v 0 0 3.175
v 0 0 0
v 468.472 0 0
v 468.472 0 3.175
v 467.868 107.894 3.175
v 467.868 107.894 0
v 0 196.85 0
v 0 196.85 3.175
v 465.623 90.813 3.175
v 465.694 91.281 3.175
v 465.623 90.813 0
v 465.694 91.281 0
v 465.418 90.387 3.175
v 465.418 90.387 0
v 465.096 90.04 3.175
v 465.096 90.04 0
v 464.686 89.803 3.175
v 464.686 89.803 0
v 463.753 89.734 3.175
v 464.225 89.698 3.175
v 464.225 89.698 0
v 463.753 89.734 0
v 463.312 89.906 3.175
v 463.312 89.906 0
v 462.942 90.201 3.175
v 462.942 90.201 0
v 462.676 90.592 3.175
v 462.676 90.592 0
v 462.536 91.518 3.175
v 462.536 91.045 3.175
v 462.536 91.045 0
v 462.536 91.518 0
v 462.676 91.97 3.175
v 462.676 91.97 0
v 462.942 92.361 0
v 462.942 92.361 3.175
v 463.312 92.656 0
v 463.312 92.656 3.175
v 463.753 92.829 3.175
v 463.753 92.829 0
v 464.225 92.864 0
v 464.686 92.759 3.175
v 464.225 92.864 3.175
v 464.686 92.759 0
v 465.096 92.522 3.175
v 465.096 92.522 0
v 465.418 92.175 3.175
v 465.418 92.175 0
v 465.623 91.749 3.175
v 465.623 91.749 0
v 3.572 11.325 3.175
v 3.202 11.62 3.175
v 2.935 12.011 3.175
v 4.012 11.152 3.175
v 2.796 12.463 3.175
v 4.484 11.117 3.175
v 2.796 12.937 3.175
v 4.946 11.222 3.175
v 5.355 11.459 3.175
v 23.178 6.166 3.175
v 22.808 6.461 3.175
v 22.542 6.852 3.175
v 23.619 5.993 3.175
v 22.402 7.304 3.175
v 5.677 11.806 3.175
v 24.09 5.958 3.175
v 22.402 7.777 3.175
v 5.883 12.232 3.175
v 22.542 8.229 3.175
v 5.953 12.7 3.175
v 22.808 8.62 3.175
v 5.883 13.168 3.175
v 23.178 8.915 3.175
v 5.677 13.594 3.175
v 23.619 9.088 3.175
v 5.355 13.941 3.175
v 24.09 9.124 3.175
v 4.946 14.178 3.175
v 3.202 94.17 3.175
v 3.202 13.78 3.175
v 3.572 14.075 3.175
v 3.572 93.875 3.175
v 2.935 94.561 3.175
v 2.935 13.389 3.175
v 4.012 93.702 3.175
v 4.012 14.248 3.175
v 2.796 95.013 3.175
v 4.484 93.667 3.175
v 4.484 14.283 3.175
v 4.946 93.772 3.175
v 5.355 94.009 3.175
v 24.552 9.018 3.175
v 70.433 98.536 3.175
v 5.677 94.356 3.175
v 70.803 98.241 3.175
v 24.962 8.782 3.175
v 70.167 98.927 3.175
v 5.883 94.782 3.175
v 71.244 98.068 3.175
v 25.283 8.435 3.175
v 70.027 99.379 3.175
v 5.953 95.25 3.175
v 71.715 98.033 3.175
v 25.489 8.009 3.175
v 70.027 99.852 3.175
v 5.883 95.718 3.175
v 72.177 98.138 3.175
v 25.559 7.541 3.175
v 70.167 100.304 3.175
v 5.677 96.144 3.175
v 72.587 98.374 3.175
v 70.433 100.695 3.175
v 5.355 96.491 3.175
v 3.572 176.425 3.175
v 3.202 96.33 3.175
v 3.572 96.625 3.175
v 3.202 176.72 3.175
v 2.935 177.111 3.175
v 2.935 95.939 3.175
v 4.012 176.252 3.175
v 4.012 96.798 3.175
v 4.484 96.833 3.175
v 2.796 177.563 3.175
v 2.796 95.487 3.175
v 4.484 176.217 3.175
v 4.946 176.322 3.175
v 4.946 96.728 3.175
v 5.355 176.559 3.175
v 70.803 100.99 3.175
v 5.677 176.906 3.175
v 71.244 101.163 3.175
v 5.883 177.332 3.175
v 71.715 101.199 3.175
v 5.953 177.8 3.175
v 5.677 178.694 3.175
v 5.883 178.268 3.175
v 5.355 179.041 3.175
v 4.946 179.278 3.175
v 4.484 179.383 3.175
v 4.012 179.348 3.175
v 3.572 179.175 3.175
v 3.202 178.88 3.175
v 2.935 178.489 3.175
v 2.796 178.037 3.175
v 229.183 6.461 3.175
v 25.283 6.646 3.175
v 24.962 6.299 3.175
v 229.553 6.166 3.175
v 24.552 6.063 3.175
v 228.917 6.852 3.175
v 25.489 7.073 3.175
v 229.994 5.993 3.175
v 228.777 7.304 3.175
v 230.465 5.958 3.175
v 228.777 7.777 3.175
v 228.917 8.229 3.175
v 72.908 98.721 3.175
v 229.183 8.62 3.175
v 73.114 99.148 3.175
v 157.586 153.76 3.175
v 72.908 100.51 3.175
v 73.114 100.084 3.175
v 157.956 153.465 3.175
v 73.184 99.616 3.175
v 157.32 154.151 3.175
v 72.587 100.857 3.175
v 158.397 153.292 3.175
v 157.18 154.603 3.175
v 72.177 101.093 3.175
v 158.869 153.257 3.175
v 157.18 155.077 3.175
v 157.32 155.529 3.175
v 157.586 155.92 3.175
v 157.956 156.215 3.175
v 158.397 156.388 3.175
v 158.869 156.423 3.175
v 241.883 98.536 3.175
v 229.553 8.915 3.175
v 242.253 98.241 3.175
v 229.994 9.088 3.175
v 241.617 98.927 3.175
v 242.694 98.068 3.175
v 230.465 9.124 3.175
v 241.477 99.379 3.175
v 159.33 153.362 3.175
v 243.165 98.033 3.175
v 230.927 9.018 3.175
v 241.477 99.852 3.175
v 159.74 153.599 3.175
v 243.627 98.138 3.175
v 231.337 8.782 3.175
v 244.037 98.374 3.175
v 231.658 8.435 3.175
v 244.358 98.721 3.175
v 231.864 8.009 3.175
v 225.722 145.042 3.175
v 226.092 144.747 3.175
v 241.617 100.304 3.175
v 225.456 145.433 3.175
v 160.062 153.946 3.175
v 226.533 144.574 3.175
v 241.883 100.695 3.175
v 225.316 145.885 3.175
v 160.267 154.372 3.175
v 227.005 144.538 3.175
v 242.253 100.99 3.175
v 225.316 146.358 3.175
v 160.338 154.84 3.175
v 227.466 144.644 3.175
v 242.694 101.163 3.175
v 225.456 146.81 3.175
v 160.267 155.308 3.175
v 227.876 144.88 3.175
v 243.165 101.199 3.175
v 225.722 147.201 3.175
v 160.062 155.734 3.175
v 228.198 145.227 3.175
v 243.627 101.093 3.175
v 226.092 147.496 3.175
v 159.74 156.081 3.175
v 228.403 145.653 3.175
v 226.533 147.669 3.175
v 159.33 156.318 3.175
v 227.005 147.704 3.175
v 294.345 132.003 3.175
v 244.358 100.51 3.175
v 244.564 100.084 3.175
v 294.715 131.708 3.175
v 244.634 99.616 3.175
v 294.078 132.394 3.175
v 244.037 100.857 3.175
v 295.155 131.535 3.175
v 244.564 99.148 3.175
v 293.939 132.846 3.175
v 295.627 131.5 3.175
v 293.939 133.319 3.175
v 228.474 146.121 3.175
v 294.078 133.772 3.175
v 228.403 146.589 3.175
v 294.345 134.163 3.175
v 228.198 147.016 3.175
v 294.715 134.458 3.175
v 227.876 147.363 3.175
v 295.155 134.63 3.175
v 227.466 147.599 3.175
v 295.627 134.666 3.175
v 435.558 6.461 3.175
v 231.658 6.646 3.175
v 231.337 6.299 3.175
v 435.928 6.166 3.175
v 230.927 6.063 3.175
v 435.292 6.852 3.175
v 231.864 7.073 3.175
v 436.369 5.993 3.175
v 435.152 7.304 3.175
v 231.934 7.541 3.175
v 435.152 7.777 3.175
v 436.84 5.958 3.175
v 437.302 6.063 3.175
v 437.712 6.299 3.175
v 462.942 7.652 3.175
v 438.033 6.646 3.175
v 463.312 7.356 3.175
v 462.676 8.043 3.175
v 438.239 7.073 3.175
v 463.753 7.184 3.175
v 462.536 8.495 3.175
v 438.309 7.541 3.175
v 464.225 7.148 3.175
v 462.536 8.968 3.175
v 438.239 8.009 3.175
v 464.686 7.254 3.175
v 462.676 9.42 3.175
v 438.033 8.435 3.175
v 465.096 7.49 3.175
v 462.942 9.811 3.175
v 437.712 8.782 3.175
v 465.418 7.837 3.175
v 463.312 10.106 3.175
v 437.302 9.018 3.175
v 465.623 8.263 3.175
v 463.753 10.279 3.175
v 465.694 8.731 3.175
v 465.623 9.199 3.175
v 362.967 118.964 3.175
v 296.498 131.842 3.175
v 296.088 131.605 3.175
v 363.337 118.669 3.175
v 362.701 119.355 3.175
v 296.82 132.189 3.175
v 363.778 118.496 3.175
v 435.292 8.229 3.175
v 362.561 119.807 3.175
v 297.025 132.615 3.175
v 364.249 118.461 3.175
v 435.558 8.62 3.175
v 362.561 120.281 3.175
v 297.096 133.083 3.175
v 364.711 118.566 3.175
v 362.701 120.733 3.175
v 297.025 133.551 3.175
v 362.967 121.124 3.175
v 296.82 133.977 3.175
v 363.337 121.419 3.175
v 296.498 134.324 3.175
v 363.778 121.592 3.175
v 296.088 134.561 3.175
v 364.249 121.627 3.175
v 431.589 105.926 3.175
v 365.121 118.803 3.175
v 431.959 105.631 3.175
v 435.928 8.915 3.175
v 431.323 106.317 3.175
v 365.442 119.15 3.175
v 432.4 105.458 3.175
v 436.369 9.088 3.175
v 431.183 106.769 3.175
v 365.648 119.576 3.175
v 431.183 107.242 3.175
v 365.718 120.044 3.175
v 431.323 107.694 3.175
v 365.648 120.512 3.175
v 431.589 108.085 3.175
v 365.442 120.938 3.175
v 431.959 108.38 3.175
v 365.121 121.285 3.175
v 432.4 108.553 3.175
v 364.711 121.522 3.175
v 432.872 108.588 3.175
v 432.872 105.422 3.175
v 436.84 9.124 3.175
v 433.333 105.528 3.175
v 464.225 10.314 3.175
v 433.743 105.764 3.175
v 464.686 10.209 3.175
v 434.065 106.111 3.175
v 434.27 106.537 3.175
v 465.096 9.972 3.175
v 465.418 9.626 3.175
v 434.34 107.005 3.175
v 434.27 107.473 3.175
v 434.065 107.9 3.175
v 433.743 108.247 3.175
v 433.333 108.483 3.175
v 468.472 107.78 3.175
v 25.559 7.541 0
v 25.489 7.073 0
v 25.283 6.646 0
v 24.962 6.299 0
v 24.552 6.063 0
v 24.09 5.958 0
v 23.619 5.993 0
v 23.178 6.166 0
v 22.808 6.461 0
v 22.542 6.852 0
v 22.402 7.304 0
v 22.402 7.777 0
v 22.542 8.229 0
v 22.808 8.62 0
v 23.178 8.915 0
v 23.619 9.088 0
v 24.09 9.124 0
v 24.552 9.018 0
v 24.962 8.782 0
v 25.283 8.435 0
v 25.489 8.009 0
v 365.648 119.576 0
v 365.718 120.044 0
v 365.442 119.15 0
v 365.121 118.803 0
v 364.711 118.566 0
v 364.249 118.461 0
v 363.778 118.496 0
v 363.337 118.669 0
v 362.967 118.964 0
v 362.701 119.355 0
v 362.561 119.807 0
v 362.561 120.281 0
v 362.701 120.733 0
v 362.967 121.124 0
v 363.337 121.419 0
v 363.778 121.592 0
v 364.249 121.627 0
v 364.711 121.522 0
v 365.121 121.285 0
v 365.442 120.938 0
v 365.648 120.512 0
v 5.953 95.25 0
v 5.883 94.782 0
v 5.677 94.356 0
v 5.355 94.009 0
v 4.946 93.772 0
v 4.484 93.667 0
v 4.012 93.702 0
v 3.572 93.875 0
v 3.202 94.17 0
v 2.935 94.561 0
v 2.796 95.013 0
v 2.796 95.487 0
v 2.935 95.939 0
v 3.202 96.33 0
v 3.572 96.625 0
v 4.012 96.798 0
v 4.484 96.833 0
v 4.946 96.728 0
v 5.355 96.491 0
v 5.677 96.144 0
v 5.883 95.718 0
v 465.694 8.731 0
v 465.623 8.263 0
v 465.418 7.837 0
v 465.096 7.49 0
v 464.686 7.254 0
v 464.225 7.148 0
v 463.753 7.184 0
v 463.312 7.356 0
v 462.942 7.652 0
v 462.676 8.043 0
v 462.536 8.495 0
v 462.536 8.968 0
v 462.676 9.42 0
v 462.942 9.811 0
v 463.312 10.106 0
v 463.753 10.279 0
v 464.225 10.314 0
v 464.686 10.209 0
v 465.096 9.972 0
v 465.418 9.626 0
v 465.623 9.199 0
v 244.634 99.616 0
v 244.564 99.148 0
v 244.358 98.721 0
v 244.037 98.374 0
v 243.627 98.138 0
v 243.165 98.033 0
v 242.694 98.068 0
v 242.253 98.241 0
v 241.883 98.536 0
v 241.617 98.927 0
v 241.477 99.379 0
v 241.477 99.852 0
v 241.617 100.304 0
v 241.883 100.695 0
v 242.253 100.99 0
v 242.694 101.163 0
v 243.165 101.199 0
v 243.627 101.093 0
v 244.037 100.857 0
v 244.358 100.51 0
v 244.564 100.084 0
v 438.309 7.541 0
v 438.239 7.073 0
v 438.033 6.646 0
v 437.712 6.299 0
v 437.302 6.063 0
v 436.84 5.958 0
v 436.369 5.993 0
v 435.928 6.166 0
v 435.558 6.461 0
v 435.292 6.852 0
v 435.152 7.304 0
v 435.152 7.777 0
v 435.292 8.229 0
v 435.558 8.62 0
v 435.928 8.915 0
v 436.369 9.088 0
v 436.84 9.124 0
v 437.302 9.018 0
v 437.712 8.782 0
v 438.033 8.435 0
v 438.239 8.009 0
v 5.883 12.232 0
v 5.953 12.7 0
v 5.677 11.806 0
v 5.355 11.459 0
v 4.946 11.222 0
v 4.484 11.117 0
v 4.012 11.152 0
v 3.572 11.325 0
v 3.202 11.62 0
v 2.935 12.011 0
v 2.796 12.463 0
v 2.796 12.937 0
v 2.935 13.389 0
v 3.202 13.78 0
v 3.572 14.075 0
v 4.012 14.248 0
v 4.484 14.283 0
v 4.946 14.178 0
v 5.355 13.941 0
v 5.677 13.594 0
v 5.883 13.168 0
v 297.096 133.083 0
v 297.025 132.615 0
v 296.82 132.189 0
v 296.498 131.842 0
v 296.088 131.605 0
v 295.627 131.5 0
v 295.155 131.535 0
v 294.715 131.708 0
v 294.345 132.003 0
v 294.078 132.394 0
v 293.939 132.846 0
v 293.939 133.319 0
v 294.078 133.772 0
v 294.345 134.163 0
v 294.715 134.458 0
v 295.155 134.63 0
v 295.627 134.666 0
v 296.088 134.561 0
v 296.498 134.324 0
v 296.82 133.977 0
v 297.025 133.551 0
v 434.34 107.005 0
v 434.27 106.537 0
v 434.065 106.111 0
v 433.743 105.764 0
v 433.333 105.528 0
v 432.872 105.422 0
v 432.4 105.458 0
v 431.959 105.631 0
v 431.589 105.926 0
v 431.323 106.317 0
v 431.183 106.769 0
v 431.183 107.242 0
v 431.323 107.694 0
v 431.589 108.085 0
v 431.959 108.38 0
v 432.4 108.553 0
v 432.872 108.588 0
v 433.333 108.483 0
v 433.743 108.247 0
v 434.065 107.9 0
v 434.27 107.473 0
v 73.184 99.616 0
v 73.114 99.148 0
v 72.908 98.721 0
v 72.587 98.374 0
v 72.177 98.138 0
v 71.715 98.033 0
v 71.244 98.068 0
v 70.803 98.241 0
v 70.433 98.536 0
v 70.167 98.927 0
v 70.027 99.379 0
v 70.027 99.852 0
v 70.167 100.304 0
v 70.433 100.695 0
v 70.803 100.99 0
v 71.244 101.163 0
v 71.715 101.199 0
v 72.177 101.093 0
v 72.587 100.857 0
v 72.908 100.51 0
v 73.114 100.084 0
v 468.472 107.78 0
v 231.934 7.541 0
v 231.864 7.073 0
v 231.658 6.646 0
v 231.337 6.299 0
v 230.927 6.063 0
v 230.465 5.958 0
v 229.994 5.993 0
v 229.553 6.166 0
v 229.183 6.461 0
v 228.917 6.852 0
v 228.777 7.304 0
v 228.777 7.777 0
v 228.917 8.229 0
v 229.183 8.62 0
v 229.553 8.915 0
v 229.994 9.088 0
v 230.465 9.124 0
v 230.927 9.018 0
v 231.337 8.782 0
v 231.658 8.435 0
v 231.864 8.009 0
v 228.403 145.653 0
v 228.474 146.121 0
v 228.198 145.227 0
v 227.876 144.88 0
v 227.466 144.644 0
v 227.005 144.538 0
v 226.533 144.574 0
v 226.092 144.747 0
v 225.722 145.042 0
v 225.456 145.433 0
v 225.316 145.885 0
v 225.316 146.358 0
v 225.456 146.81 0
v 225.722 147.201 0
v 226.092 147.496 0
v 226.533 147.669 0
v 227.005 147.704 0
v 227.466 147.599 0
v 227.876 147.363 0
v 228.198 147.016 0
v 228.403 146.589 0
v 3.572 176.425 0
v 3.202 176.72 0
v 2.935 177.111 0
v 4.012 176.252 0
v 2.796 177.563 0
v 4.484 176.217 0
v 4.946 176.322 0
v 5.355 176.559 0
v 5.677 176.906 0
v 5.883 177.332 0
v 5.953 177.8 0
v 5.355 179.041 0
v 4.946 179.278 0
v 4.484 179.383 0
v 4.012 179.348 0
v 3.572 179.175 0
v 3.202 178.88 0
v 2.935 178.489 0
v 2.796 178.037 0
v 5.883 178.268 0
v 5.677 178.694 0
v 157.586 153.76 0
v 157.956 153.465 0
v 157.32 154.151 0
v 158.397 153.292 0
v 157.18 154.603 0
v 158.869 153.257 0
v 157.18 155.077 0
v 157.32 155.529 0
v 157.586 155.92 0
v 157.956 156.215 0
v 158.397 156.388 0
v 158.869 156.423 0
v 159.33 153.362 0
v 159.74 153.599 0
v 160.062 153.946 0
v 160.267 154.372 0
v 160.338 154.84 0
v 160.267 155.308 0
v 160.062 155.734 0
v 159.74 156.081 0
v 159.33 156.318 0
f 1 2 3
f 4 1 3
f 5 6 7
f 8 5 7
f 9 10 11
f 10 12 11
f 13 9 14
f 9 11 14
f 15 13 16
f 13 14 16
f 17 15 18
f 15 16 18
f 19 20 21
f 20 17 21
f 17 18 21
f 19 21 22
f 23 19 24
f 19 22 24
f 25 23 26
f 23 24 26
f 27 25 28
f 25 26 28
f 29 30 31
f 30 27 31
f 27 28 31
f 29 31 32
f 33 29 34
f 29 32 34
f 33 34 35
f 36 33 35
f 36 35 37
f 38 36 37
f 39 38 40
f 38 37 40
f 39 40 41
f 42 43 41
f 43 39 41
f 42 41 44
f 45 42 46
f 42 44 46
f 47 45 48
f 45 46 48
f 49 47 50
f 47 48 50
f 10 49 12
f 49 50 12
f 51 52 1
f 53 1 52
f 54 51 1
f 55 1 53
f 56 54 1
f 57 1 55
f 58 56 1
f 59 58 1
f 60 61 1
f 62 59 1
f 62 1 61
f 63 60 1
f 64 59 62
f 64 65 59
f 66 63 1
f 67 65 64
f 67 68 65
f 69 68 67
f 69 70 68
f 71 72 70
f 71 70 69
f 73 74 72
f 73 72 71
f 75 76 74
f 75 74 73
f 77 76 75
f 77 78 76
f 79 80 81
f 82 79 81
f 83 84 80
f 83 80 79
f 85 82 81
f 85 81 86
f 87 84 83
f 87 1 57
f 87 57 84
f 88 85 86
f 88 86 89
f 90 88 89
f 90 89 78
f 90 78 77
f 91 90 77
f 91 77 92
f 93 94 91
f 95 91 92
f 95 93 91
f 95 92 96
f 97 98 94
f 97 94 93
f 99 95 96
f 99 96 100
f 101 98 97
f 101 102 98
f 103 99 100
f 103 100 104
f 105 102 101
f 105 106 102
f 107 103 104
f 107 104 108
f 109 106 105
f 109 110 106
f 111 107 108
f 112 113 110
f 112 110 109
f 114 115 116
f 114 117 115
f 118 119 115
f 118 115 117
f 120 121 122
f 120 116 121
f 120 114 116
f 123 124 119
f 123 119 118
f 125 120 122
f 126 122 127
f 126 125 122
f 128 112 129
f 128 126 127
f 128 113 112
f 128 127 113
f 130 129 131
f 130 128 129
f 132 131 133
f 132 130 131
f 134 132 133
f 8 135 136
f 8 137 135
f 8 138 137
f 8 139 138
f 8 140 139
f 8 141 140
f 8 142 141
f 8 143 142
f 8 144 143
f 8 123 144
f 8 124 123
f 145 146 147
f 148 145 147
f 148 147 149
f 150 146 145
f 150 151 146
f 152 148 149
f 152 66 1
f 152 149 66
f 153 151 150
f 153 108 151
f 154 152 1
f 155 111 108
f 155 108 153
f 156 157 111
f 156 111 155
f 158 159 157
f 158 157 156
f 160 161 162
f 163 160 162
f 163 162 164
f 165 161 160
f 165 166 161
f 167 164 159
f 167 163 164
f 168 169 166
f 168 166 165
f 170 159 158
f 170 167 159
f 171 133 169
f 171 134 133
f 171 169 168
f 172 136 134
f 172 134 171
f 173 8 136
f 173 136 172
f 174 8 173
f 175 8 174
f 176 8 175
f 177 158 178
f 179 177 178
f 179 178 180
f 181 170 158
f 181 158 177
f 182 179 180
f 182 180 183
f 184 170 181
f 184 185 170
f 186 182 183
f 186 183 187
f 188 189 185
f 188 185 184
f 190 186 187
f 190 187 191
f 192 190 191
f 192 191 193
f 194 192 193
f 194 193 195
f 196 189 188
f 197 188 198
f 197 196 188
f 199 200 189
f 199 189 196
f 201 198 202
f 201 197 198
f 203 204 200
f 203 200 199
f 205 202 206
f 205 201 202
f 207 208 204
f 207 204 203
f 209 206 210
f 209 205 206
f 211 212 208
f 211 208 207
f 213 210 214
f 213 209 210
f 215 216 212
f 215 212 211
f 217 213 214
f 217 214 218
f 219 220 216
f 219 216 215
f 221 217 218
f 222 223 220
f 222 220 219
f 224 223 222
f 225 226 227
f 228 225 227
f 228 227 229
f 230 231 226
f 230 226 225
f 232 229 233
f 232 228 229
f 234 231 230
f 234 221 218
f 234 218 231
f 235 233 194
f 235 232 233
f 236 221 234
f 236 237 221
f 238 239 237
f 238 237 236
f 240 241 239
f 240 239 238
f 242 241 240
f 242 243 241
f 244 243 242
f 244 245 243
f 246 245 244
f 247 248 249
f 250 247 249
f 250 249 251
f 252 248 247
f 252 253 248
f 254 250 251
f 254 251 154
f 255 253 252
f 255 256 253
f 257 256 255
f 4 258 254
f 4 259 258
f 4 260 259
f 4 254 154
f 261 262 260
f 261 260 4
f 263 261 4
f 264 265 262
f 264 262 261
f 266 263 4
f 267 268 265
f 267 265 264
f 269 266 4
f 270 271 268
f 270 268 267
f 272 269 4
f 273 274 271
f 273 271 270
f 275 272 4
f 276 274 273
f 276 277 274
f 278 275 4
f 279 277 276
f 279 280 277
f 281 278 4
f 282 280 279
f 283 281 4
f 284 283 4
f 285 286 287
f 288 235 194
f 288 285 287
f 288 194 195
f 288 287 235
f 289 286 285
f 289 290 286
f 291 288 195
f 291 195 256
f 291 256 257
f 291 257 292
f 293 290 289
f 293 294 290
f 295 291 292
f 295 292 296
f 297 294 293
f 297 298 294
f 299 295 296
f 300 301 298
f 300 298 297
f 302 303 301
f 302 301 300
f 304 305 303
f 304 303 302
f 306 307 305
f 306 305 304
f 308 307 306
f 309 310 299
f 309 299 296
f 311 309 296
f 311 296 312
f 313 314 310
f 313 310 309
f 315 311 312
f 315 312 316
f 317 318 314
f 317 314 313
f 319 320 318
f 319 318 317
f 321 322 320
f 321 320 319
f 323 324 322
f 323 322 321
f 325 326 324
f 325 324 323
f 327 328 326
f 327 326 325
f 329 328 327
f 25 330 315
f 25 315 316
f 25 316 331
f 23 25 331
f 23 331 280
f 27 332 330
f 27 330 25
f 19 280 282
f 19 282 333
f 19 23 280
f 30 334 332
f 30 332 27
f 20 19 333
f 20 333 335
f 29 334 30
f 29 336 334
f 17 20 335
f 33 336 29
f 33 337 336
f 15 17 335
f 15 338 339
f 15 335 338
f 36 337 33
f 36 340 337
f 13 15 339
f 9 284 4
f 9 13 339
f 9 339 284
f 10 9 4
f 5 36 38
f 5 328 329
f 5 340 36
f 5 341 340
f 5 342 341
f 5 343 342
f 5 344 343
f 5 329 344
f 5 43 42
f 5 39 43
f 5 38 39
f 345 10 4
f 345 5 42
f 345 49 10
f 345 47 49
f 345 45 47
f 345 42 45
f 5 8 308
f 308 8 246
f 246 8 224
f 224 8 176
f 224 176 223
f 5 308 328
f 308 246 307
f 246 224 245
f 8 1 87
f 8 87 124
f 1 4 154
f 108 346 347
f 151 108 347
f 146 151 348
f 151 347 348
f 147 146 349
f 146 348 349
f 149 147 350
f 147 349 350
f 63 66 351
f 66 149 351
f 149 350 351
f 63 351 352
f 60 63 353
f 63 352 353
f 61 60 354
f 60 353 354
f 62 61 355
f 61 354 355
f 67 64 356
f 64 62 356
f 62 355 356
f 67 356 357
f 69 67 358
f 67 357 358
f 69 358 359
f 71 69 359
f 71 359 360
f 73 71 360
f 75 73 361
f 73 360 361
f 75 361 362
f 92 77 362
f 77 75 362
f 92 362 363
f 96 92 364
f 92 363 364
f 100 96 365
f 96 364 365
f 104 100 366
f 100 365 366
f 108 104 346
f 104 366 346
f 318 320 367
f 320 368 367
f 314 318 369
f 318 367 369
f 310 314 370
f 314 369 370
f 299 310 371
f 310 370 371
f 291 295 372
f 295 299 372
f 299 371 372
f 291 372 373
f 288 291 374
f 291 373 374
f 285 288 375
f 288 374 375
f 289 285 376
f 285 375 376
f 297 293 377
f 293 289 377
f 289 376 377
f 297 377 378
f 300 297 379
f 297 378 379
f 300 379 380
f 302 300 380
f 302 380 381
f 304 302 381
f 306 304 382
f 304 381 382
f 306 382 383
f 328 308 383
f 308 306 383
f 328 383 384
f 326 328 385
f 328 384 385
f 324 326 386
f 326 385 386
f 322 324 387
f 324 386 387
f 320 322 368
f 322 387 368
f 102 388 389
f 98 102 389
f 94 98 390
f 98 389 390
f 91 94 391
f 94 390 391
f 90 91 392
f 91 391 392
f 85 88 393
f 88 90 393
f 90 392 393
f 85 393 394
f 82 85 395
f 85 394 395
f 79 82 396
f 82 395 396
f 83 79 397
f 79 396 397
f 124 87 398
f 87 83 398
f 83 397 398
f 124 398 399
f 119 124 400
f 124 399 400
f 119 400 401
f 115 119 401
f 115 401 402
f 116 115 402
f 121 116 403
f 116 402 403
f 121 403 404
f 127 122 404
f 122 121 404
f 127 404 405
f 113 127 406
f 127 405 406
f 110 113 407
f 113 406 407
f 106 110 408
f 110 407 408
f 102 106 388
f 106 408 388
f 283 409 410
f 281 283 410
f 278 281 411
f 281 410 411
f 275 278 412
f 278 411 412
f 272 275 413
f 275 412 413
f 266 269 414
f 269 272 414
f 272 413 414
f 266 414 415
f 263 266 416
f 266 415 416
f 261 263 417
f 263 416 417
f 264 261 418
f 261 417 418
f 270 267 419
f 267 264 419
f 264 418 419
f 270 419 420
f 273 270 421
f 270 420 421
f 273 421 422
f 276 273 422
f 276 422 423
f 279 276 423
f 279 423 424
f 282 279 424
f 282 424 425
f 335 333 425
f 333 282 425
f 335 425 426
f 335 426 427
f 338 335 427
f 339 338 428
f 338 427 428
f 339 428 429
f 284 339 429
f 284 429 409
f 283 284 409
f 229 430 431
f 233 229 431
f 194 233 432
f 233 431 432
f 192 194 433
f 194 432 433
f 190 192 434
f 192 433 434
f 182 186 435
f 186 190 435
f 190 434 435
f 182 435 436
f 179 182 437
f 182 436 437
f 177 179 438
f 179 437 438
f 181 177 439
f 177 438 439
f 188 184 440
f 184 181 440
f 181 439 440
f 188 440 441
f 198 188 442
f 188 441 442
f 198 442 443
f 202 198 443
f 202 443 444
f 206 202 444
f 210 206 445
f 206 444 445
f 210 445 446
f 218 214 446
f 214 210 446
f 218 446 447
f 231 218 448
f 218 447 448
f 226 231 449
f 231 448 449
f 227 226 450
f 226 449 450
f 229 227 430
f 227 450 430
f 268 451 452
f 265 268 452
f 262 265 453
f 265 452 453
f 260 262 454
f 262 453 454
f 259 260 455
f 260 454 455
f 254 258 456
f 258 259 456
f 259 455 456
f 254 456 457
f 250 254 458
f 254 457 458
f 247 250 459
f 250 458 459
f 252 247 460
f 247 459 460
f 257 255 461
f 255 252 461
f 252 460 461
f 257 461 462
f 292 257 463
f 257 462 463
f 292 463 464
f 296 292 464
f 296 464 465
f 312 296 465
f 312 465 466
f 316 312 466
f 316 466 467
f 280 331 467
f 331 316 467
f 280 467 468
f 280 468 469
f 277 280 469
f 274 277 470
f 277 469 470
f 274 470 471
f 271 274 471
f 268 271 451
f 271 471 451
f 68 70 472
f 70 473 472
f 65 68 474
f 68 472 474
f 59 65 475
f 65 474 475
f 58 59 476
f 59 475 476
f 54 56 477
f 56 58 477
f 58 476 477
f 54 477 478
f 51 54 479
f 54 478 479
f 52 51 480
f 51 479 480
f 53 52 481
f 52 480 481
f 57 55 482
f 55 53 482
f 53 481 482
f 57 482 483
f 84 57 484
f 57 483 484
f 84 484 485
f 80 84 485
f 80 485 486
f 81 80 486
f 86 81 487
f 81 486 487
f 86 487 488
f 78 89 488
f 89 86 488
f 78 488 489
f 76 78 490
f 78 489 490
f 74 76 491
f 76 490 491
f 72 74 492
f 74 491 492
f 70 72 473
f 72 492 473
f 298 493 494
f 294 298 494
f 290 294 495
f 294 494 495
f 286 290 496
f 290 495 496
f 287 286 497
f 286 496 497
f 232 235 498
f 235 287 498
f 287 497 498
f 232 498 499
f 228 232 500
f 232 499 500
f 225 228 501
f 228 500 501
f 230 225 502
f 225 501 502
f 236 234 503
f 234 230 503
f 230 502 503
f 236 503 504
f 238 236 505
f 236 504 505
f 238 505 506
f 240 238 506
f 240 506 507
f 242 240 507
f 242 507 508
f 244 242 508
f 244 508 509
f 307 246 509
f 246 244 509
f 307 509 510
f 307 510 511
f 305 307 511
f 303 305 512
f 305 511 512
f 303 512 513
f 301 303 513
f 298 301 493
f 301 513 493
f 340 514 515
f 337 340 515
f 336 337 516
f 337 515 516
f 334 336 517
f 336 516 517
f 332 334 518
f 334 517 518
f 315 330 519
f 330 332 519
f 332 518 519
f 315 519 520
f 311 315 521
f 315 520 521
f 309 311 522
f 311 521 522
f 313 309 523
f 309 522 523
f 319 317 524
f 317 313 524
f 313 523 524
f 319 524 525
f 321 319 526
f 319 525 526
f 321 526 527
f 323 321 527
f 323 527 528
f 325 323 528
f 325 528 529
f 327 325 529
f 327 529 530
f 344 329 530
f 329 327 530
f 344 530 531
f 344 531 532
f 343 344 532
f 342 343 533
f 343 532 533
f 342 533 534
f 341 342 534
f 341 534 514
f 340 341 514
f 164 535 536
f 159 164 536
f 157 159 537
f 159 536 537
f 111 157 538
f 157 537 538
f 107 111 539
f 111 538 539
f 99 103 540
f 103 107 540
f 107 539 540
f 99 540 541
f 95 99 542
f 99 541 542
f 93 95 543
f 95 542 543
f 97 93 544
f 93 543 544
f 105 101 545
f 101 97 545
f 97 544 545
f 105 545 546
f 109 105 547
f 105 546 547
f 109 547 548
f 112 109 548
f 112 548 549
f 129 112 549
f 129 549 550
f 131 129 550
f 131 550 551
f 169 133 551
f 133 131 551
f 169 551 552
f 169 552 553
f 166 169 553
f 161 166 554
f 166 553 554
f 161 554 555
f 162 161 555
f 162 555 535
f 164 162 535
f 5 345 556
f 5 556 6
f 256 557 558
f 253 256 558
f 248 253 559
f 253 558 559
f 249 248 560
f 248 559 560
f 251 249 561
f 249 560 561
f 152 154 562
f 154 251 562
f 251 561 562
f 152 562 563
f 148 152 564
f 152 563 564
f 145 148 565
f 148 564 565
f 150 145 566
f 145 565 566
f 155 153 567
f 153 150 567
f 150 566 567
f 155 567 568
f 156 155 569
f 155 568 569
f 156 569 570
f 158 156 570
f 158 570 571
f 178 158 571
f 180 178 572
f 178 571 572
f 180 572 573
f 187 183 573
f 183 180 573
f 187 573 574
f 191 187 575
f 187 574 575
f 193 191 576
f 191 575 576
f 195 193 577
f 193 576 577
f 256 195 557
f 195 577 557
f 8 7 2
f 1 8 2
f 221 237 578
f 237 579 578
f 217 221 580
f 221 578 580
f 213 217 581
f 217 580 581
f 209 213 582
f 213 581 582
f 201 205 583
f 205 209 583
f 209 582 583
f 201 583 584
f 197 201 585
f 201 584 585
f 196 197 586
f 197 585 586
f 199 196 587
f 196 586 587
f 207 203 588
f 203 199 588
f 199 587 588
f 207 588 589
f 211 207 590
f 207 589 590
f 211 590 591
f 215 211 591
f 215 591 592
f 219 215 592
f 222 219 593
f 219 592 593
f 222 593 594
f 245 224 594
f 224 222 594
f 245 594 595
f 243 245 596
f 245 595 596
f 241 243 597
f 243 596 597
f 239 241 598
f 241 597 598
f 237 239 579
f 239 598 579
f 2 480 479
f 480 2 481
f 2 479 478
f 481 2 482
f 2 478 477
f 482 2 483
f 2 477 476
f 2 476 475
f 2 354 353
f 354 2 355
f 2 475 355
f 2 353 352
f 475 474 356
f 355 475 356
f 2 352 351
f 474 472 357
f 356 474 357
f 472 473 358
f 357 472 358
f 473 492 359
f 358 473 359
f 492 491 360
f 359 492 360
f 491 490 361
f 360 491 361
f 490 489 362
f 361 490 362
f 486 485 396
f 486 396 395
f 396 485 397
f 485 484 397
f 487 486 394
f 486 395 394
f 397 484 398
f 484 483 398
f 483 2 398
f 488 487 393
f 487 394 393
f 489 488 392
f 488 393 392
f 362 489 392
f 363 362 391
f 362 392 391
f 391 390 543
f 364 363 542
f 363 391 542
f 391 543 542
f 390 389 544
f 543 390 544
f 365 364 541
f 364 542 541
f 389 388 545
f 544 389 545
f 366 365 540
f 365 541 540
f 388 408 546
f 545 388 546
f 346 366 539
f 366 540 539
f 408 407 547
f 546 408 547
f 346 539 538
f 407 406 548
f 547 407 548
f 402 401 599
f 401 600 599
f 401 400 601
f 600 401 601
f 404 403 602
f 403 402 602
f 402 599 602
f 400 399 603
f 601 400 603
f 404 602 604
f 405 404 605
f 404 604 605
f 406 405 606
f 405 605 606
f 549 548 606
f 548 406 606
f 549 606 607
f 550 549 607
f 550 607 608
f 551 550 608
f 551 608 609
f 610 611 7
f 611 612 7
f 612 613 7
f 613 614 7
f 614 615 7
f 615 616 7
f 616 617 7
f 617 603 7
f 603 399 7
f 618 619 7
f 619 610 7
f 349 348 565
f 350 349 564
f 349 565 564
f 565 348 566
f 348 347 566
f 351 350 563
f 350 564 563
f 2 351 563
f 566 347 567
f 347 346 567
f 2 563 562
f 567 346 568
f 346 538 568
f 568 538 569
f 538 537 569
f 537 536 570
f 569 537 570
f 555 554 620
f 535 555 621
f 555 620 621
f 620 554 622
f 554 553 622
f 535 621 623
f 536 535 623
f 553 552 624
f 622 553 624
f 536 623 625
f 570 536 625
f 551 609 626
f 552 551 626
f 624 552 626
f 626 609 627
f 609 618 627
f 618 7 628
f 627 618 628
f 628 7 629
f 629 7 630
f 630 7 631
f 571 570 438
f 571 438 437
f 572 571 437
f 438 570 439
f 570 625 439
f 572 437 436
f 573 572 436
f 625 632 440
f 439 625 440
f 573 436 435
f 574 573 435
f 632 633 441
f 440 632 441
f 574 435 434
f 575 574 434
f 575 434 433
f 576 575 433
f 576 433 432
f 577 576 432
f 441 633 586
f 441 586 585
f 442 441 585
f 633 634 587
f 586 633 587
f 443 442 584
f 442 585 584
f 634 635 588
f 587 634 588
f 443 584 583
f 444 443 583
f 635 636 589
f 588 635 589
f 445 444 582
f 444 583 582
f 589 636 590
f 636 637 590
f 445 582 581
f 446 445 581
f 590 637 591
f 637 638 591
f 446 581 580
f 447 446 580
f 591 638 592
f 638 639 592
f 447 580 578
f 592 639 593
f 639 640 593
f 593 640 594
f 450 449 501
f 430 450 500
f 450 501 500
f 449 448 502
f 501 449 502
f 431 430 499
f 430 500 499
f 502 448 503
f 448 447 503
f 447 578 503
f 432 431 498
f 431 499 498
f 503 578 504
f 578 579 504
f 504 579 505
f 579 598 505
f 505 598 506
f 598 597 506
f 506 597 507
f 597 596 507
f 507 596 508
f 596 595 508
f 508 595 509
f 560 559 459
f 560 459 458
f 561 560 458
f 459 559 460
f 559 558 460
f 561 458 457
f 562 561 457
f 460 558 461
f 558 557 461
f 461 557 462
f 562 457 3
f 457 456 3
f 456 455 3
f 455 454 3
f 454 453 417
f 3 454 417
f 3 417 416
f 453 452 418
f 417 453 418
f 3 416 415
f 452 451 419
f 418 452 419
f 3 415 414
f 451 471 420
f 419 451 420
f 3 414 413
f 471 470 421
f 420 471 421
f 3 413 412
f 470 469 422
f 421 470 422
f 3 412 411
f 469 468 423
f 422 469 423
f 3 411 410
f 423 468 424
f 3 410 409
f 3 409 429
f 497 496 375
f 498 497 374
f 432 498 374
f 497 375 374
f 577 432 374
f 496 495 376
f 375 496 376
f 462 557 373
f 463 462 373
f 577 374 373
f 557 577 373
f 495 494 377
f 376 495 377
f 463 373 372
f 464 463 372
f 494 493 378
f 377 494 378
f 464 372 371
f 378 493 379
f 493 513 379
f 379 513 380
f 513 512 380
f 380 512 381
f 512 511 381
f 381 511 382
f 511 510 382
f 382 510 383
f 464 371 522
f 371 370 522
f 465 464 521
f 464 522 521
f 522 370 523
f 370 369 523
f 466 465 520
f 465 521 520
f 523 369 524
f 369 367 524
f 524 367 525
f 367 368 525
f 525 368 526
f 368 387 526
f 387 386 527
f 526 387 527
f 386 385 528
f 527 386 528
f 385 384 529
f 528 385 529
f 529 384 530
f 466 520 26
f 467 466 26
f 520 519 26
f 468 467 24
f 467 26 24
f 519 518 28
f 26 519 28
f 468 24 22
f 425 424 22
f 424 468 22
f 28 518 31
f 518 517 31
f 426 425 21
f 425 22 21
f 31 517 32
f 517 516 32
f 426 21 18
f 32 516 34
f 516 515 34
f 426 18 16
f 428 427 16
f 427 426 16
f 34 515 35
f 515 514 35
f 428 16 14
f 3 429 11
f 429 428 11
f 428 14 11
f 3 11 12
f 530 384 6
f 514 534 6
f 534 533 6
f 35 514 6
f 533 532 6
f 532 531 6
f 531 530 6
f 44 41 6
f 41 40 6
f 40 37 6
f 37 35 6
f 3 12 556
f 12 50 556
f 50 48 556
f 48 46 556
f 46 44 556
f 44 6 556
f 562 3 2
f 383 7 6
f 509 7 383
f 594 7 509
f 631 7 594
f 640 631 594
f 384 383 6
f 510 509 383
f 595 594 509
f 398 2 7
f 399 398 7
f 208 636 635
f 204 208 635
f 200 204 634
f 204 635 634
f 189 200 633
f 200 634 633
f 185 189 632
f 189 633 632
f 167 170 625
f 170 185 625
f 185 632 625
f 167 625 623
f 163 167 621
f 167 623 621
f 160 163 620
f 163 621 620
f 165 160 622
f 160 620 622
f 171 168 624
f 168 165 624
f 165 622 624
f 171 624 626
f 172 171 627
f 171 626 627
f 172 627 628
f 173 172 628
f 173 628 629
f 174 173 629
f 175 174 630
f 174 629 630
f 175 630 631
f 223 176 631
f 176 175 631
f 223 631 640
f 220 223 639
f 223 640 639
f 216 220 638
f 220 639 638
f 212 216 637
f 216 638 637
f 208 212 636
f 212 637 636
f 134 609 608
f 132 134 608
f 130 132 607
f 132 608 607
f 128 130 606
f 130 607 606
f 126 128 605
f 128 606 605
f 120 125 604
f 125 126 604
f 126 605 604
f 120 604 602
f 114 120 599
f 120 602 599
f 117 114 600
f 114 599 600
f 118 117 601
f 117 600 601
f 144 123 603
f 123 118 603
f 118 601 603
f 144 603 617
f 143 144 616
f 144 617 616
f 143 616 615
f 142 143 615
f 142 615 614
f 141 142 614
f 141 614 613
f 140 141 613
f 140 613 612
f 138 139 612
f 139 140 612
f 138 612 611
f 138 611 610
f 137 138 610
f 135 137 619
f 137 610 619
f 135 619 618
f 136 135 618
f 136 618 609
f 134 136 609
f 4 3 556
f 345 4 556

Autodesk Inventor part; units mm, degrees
ref_plane "YZ Plane" through (0, 0, 0) normal (1, 0, 0) x (0, 1, 0)
ref_plane "XZ Plane" through (0, 0, 0) normal (0, 1, 0) x (-1, 0, 0)
ref_plane "XY Plane" through (0, 0, 0) normal (0, 0, 1) x (1, 0, 0)
sketch "Sketch1" plane through (0, 0, 0) normal (0, 0, 1) x (1, 0, 0)
  line L0 (467.8685, 107.8942) -> (0, 196.85)
  line L1 (0, 0) -> (467.8685, 0)
  line L2 (0, 196.85) -> (0, 0)
  line L3 (467.8685, 107.8942) -> (467.8685, 0)
  line L4 (467.8685, 0) -> (468.4718, 0)
  line L5 (468.4718, 0) -> (468.4718, 107.7795)
  line L6 (468.4718, 107.7795) -> (467.8685, 107.8942)
  circle A0 centre (295.5085, 133.0828) radius 1.5875
  circle A1 centre (432.753, 107.0054) radius 1.5875
  circle A2 centre (364.1308, 120.0441) radius 1.5875
  circle A3 centre (226.8862, 146.1214) radius 1.5875
  line L7 (443.6664, 113.4153) -> (440.703, 97.8194) construction
  line L8 (443.6664, 113.4153) -> (219.0844, 156.0873) construction
  line L9 (216.1211, 140.4914) -> (219.0844, 156.0873) construction
  line L10 (440.703, 97.8194) -> (216.1211, 140.4914) construction
  circle A4 centre (230.3468, 7.5406) radius 1.5875
  circle A5 centre (436.7218, 7.5406) radius 1.5875
  circle A6 centre (23.9718, 7.5406) radius 1.5875
  line L11 (446.2468, 15.0813) -> (446.2468, -0.7937) construction
  line L12 (446.2468, 15.0813) -> (14.4468, 15.0813) construction
  line L13 (14.4468, -0.7937) -> (14.4468, 15.0813) construction
  line L14 (446.2468, -0.7937) -> (14.4468, -0.7937) construction
  circle A7 centre (4.3656, 95.25) radius 1.5875
  circle A8 centre (4.3656, 177.8) radius 1.5875
  circle A9 centre (4.3656, 12.7) radius 1.5875
  line L15 (-3.9687, 190.5) -> (11.9063, 190.5) construction
  line L16 (-3.9687, 190.5) -> (-3.9687, 0) construction
  line L17 (11.9063, 0) -> (-3.9687, 0) construction
  line L18 (11.9063, 190.5) -> (11.9063, 0) construction
  circle A10 centre (464.1061, 8.7313) radius 1.5875
  circle A11 centre (464.1061, 91.2812) radius 1.5875
  line L19 (456.5655, -0.7937) -> (471.6468, -0.7937) construction
  line L20 (456.5655, -0.7937) -> (456.5655, 100.8062) construction
  line L21 (471.6468, 100.8062) -> (456.5655, 100.8062) construction
  line L22 (471.6468, -0.7937) -> (471.6468, 100.8062) construction
  circle A12 centre (71.5968, 99.6156) radius 1.5875
  line L23 (81.1218, 107.95) -> (81.1218, 92.075) construction
  line L24 (81.1218, 107.95) -> (62.0718, 107.95) construction
  line L25 (62.0718, 92.075) -> (62.0718, 107.95) construction
  line L26 (81.1218, 92.075) -> (62.0718, 92.075) construction
  circle A13 centre (243.0468, 99.6156) radius 1.5875
  line L27 (252.5718, 107.95) -> (252.5718, 92.075) construction
  line L28 (252.5718, 107.95) -> (233.5218, 107.95) construction
  line L29 (233.5218, 92.075) -> (233.5218, 107.95) construction
  line L30 (252.5718, 92.075) -> (233.5218, 92.075) construction
  circle A14 centre (158.75, 154.8401) radius 1.5875
  line L31 (146.05, 145.3151) -> (146.05, 158.0151) construction
  line L32 (146.05, 145.3151) -> (171.45, 145.3151) construction
  line L33 (171.45, 158.0151) -> (171.45, 145.3151) construction
  line L34 (146.05, 158.0151) -> (171.45, 158.0151) construction
extrude "Extrusion1" add sketch "Sketch1" along normal blind 3.175
properties part number "Hopper Front" material "Polycarbonate, Clear"
